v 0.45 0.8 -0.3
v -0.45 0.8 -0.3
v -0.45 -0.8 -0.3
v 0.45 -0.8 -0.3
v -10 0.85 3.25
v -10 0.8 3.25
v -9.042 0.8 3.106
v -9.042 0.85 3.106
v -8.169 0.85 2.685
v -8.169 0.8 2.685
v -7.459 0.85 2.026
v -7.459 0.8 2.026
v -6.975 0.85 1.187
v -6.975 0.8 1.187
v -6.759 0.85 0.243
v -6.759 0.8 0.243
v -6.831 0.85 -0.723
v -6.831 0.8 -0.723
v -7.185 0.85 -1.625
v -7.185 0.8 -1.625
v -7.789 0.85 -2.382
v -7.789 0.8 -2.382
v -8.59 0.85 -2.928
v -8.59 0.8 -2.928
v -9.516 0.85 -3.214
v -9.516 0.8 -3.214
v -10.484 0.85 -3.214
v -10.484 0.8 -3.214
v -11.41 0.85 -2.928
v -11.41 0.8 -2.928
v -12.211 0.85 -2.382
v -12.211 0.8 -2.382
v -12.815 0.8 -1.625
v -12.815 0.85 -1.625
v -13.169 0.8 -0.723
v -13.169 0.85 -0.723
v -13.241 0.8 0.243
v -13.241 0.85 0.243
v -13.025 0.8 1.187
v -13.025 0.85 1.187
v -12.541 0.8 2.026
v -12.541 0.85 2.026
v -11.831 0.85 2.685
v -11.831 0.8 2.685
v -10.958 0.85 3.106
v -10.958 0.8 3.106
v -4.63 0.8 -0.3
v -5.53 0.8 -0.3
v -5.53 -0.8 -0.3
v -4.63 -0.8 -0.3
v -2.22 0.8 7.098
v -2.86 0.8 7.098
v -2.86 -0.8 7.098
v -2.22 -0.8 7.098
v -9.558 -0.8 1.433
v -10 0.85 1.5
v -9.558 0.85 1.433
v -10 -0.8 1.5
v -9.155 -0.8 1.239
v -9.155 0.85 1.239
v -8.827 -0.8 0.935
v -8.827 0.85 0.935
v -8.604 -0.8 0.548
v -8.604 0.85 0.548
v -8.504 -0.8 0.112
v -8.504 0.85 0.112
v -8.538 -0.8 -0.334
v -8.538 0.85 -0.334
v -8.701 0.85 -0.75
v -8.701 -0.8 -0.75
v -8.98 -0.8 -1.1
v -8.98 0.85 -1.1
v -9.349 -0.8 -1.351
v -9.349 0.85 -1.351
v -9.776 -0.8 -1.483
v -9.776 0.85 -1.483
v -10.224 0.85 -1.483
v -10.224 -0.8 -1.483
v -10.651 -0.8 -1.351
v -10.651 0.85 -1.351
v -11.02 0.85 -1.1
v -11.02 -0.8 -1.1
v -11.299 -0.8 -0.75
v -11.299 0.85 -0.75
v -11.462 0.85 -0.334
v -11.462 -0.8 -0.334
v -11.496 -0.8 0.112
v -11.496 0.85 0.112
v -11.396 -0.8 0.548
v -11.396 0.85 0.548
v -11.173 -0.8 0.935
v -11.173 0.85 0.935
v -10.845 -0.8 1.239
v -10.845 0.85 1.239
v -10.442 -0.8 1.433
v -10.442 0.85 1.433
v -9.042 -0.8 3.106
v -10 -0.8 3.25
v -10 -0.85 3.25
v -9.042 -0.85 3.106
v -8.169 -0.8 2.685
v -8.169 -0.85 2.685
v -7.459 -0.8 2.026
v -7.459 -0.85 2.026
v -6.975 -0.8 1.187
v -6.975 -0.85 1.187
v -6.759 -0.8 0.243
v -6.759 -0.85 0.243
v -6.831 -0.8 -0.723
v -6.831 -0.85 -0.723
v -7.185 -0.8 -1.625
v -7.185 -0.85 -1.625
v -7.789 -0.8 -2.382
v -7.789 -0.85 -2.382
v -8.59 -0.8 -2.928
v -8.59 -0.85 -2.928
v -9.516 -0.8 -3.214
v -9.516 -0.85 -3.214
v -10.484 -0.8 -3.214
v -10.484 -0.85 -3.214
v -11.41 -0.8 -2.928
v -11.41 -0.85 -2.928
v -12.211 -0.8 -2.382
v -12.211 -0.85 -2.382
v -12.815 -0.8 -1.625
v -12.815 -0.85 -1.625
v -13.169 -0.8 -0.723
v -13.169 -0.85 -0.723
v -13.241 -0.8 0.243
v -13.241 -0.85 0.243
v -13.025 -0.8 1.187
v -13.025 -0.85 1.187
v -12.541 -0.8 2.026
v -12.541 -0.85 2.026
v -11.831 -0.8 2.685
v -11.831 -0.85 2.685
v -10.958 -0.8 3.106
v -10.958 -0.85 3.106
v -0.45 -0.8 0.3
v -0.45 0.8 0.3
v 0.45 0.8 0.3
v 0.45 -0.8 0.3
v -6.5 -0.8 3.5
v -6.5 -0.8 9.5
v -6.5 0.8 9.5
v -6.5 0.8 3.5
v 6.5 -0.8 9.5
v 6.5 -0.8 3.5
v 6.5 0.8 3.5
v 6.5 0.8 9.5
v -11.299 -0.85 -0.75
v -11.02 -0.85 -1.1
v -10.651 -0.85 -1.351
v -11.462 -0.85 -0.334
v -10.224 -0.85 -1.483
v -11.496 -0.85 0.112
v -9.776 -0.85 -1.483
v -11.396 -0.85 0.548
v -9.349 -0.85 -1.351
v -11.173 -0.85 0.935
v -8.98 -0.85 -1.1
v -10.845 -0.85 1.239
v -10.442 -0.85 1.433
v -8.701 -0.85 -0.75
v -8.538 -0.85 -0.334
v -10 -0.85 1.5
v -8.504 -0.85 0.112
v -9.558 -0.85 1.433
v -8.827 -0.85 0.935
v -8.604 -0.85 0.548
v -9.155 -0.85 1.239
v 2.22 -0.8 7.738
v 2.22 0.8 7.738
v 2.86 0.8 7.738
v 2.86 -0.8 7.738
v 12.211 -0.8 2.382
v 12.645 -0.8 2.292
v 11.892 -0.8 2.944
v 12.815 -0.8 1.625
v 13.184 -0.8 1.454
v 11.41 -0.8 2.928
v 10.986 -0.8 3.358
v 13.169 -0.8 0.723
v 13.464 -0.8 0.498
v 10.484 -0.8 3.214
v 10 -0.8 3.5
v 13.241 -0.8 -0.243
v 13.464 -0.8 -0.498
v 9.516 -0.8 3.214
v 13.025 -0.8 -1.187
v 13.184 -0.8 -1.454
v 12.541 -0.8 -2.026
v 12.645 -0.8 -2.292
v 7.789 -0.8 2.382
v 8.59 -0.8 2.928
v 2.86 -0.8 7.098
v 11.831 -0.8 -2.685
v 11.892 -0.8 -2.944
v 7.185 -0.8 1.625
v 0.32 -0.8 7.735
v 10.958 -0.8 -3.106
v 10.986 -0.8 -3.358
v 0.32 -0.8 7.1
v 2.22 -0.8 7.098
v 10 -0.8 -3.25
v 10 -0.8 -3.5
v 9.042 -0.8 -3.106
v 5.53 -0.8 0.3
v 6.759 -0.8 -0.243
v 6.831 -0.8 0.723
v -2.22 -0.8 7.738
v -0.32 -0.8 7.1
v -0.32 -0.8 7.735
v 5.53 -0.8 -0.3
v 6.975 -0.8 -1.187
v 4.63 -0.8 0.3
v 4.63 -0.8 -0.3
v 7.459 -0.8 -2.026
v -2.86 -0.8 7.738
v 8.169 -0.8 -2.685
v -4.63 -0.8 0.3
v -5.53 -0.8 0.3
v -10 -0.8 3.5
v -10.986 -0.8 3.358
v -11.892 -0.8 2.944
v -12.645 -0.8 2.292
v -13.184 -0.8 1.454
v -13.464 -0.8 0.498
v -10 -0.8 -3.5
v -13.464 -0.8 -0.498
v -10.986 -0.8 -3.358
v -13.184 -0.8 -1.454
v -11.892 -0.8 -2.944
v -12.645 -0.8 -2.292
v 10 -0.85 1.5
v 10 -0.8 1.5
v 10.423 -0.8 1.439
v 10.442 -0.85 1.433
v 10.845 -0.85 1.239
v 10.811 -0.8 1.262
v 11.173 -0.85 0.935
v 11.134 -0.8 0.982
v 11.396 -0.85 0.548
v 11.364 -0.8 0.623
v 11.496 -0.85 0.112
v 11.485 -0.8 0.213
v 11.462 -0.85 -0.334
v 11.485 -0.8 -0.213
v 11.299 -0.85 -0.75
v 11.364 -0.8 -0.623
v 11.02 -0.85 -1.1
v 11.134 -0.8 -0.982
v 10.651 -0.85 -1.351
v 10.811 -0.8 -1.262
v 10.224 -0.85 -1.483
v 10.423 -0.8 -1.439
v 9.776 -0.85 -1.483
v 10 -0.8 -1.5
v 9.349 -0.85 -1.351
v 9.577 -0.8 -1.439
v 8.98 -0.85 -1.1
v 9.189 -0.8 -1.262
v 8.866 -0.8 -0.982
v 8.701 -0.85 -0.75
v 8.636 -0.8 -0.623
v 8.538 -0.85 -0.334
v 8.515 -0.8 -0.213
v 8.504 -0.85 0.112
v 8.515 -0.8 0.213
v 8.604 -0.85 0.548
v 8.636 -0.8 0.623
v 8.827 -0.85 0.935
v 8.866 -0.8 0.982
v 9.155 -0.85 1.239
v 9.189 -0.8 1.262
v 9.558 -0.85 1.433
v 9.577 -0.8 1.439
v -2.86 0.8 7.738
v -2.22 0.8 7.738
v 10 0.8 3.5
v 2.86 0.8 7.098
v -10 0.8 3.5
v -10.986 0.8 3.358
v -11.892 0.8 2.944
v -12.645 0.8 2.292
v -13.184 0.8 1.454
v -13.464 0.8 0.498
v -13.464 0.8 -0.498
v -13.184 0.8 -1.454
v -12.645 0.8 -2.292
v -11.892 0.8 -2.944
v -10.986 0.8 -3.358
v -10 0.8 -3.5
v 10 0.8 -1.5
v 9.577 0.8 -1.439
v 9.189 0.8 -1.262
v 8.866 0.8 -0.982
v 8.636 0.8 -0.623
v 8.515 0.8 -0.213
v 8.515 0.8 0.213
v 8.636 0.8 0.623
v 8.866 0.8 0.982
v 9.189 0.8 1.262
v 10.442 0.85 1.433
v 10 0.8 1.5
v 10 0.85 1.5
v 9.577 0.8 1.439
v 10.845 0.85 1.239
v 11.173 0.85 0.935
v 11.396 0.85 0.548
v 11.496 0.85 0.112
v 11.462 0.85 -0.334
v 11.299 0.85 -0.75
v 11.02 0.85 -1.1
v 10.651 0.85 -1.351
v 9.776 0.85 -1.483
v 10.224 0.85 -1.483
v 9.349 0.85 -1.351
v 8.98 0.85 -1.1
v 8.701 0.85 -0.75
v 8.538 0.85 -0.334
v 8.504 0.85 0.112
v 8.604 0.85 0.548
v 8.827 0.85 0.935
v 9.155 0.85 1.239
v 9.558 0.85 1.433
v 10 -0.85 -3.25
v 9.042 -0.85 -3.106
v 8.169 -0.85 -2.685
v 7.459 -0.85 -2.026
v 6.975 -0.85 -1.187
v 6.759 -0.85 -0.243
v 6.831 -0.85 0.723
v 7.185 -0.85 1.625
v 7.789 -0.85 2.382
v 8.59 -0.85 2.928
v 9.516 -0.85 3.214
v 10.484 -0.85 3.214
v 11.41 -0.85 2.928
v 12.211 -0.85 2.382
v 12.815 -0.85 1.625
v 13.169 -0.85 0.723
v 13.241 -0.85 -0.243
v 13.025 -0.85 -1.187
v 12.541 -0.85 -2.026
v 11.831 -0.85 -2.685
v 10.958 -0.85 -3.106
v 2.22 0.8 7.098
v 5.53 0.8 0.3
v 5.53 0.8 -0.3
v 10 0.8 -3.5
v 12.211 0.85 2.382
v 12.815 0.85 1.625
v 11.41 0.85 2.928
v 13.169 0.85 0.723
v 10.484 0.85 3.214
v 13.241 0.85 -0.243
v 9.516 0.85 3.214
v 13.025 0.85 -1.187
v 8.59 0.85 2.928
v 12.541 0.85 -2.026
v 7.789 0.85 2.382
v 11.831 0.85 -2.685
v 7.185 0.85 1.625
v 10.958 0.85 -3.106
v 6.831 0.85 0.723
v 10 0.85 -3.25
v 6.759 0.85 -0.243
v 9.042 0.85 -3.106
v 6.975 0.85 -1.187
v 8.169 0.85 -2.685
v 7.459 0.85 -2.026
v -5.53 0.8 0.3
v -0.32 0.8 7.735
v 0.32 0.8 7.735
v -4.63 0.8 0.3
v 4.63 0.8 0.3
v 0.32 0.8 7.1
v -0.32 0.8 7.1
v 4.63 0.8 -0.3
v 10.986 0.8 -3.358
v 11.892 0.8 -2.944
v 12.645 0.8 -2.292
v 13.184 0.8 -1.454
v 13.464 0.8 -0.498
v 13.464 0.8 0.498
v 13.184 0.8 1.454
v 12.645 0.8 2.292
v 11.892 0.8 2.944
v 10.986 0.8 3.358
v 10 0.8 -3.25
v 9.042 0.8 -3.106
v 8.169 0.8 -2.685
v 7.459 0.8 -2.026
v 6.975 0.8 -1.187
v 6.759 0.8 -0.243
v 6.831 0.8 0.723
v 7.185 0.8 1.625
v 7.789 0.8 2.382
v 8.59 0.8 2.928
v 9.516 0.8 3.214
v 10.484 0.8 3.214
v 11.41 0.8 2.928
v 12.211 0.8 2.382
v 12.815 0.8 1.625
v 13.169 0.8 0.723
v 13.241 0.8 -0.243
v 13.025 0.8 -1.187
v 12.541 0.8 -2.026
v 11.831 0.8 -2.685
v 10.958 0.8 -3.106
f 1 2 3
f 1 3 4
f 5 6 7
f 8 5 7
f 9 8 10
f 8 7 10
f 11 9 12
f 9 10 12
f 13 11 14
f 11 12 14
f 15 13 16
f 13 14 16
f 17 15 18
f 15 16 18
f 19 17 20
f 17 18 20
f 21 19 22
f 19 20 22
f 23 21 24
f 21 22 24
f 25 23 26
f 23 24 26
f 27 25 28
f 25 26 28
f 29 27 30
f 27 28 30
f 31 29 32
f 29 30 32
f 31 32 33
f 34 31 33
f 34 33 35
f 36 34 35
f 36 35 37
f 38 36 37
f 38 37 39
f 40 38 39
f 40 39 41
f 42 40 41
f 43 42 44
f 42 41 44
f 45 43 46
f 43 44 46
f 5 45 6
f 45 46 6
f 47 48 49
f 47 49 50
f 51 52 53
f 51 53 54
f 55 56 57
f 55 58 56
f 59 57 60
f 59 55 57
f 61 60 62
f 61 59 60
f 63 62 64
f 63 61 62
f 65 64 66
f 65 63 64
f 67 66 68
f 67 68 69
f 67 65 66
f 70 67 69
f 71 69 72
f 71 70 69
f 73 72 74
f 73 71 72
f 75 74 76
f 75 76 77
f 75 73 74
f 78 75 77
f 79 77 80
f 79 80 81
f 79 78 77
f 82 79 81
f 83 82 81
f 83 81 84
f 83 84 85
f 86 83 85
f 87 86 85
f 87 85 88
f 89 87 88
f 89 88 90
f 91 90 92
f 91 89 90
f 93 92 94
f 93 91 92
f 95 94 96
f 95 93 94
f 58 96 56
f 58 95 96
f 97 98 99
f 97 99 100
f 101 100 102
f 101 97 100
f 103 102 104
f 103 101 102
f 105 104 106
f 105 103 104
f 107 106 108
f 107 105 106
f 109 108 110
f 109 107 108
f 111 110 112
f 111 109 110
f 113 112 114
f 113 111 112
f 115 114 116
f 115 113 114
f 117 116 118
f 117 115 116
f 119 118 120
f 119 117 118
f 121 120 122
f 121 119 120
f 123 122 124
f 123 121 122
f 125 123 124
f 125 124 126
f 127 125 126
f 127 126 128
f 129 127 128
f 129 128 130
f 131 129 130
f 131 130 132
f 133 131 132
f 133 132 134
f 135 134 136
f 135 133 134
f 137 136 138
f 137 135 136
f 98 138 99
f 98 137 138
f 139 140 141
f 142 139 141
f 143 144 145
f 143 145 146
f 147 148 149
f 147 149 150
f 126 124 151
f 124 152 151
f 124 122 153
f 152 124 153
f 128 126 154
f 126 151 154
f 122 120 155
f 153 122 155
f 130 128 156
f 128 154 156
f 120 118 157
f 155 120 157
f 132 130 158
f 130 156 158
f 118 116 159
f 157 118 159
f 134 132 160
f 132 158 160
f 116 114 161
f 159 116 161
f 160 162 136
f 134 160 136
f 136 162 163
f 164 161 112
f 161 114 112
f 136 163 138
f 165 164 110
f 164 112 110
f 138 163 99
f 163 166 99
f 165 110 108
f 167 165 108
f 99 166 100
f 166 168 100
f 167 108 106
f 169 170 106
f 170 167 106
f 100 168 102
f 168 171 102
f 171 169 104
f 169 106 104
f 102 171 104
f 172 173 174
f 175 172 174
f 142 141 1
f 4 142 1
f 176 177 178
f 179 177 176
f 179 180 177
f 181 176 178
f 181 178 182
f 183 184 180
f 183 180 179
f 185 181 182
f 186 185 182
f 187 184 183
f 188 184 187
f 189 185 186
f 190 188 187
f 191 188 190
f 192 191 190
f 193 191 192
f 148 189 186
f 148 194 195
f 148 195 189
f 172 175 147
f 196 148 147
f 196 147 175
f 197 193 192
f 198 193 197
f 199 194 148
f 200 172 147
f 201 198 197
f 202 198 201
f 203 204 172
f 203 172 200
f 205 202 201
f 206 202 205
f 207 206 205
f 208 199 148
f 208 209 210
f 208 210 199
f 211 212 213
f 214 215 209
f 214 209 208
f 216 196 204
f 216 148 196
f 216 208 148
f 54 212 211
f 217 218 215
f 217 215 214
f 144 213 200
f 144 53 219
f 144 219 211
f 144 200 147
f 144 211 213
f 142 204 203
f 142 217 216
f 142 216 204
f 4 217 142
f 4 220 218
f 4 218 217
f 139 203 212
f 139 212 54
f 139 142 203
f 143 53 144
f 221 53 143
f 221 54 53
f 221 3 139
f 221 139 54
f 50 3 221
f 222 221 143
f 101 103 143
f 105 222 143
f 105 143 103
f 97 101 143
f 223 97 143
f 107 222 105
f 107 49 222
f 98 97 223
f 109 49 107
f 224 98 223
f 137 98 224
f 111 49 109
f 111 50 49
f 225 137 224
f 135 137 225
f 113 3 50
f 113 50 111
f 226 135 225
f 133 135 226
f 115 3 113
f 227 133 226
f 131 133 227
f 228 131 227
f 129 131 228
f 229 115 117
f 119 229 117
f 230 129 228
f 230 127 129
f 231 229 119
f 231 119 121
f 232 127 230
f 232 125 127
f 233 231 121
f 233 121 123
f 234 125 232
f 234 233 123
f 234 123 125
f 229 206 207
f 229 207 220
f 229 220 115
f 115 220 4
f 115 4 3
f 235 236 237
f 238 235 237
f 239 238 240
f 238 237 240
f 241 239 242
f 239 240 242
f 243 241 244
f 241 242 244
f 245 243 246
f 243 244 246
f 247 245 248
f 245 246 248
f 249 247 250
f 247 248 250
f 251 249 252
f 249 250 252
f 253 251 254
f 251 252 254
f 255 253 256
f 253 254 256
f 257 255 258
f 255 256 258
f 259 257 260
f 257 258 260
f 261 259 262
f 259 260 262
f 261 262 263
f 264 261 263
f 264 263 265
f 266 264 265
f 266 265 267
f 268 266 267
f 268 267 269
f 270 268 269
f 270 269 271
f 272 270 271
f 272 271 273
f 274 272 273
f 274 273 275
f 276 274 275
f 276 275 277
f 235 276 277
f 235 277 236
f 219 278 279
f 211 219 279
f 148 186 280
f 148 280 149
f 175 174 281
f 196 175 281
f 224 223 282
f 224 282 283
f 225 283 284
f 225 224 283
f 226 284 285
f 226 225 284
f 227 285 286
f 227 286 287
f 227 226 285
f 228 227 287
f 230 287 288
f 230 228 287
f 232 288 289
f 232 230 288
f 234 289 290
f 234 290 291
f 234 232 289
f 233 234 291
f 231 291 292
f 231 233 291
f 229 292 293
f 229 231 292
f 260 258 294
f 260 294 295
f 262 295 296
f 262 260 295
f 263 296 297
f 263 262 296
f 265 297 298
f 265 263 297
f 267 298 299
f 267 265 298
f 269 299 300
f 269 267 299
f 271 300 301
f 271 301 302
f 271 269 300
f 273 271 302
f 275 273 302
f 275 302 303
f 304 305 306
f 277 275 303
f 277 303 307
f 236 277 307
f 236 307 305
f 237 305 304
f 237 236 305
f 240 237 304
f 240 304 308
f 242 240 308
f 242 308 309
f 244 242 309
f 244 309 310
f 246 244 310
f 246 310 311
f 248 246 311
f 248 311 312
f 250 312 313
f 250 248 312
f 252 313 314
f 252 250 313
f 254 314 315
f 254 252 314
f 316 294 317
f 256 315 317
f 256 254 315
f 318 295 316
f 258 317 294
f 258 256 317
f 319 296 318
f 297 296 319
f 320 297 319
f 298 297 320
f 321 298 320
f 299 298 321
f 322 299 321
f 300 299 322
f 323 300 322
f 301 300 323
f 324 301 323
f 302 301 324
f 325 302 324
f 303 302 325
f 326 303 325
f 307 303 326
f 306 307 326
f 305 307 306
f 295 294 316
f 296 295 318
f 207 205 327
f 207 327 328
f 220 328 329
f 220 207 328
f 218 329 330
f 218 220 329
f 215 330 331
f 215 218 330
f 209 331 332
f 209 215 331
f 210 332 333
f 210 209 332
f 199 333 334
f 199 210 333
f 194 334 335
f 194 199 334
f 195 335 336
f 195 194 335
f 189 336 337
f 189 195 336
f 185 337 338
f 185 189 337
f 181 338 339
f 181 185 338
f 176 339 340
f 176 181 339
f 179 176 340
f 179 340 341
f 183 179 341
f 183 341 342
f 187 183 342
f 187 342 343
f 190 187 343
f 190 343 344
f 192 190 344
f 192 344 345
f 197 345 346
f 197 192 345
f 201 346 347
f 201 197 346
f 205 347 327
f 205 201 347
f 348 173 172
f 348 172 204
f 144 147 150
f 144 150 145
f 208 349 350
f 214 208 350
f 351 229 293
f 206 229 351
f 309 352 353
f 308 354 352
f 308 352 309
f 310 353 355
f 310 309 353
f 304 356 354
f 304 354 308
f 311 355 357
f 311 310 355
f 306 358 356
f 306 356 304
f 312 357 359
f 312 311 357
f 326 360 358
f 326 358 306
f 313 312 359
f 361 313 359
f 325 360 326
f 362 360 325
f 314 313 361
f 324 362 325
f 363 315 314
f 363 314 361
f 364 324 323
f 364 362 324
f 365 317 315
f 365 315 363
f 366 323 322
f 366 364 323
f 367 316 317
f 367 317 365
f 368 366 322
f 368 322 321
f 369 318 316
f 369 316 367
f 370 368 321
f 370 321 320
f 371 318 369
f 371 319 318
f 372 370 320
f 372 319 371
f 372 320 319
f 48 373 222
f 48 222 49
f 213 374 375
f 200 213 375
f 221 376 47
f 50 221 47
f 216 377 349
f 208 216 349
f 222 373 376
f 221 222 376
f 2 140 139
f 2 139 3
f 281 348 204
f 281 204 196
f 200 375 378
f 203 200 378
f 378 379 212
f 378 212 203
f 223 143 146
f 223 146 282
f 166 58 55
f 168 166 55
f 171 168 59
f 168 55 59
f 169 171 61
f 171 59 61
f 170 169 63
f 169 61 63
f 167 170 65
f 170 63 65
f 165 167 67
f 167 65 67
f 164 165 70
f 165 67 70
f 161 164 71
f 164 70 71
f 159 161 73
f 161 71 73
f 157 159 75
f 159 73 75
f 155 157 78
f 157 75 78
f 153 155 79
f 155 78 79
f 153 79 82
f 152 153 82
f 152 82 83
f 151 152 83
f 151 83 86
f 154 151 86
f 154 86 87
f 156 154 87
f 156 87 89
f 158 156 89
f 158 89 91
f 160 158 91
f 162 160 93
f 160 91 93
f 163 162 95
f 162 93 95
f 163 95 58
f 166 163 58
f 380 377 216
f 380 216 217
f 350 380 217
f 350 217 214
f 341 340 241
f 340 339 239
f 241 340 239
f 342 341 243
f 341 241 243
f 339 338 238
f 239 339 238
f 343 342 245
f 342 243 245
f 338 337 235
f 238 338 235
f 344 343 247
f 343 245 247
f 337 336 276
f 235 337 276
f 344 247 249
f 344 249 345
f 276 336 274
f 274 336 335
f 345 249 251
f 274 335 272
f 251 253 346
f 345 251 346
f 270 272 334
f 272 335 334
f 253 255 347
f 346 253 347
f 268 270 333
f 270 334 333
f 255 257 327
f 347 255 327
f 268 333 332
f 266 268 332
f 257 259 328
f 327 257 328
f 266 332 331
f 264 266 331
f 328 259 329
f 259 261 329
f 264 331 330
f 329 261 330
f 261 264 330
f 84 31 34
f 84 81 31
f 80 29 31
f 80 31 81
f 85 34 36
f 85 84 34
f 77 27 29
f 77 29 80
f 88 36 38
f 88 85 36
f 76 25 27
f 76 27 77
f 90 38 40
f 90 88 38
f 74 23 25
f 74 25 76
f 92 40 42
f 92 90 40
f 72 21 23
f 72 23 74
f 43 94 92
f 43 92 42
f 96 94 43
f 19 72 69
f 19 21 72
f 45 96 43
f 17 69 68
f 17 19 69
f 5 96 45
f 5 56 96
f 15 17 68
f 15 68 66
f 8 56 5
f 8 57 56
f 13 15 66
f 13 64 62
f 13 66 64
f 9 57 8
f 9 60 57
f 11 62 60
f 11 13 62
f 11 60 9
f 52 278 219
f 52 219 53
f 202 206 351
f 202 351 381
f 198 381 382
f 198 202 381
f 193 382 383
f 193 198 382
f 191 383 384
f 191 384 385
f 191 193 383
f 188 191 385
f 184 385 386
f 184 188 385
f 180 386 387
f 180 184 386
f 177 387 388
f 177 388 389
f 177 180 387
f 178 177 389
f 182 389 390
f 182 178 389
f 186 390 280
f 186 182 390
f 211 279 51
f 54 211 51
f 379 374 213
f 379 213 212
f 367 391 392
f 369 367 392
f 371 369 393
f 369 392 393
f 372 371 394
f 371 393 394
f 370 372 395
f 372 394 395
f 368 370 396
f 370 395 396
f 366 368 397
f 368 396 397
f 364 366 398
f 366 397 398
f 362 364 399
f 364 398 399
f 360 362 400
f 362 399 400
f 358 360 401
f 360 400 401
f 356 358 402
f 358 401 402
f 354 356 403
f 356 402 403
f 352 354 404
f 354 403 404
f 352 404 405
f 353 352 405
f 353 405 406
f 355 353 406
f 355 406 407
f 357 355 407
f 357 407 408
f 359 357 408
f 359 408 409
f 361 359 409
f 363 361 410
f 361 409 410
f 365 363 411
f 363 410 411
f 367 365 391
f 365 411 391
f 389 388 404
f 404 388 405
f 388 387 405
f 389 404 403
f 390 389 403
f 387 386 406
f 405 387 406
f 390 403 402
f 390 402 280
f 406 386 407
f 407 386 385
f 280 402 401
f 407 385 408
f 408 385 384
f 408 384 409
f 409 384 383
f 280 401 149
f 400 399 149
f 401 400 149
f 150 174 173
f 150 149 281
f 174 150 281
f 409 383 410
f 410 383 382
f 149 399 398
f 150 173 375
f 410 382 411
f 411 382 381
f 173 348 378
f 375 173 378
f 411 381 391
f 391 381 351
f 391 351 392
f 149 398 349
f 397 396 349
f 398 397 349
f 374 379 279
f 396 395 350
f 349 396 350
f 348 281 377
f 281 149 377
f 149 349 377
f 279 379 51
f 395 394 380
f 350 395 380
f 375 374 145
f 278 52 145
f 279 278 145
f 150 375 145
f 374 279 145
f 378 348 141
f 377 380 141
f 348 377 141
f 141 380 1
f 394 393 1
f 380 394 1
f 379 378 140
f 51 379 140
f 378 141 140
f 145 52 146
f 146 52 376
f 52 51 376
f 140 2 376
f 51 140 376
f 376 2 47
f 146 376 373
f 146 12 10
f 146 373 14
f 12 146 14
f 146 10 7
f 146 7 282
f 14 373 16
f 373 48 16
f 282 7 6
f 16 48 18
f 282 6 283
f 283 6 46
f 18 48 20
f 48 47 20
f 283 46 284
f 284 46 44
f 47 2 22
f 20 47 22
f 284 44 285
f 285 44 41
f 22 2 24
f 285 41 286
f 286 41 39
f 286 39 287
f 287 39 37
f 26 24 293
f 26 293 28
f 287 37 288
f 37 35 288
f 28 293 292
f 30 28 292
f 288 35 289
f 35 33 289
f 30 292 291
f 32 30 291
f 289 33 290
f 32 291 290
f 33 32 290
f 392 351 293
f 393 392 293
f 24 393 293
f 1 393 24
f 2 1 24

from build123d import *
from build123d.topology import SkipClean

# Parameters (mm, degrees)
BOSS_EXTRUDE1_DEPTH      = 0.8
BOSS_EXTRUDE1_DEPTH_BACK = 0.8
SKETCH1_R                = 1.5
SKETCH4_R                = 3.25
SKETCH4_R_2              = 1.5
BOSS_EXTRUDE4_DEPTH      = 0.05
SKETCH5_W                = 0.64
SKETCH5_H                = 0.635
SKETCH5_H_2              = 0.64
CUT_EXTRUDE1_DEPTH       = 1.6
SKETCH6_W                = 0.9
SKETCH6_H                = 0.6
CUT_EXTRUDE2_DEPTH       = 1.6


with BuildPart() as part:
    # Sketch1 → Boss-Extrude1 (new, two sides: drawn at the far end of the back side and taken through both)
    with BuildSketch(Plane(origin=(0, 0, 0), x_dir=(1, 0, 0), z_dir=(0, 1, 0)).offset(-BOSS_EXTRUDE1_DEPTH_BACK)):
        with BuildLine():
            Line((-10, 3.5), (10, 3.5))
            ThreePointArc((10, 3.5), (13.5, 0), (10, -3.5))
            Line((10, -3.5), (6.5, -3.5))
            Line((6.5, -3.5), (6.5, -9.5))
            Line((6.5, -9.5), (-6.5, -9.5))
            Line((-6.5, -9.5), (-6.5, -3.5))
            Line((-6.5, -3.5), (-10, -3.5))
            ThreePointArc((-10, -3.5), (-13.5, 0), (-10, 3.5))
        make_face()
        with Locations(Location((-10, 0, 0), (0, 0, 270))):
            Circle(SKETCH1_R, mode=Mode.SUBTRACT)
        with Locations(Location((10, 0, 0), (0, 0, 90))):
            Circle(SKETCH1_R, mode=Mode.SUBTRACT)
    extrude(amount=BOSS_EXTRUDE1_DEPTH + BOSS_EXTRUDE1_DEPTH_BACK)

    # Sketch4 → Boss-Extrude4 (add)
    # profile 1 of 2: a face of its own
    with BuildSketch(Plane(origin=(0, 0.8, 0), x_dir=(1, 0, 0), z_dir=(0, 1, 0))):
        with Locations(Location((-10, 0, 0), (0, 0, 270))):
            Circle(SKETCH4_R)
        with Locations(Location((-10, 0, 0), (0, 0, 270))):
            Circle(SKETCH4_R_2, mode=Mode.SUBTRACT)
    # profile 2 of 2: a face of its own
    with BuildSketch(Plane(origin=(0, 0.8, 0), x_dir=(1, 0, 0), z_dir=(0, 1, 0))):
        with Locations(Location((10, 0, 0), (0, 0, 90))):
            Circle(SKETCH4_R)
        with Locations(Location((10, 0, 0), (0, 0, 270))):
            Circle(SKETCH4_R_2, mode=Mode.SUBTRACT)
    boss_extrude4 = extrude(amount=BOSS_EXTRUDE4_DEPTH)

    # Mirror1: Boss-Extrude4 across plane
    with SkipClean():  # the faces are left unmerged after this step: merging them gives an invalid solid
        add(boss_extrude4.mirror(Plane.ZX))

    # Sketch5 → Cut-Extrude1 (cut)
    with SkipClean():  # the faces are left unmerged after this step: merging them gives an invalid solid
        with BuildSketch(Plane(origin=(0, 0.8, 0), x_dir=(1, 0, 0), z_dir=(0, 1, 0))):
            with Locations((0, -7.4175)):
                Rectangle(SKETCH5_W, SKETCH5_H)
            with Locations((-2.54, -7.4175)):
                Rectangle(SKETCH5_W, SKETCH5_H_2)
            with Locations((2.54, -7.4175)):
                Rectangle(SKETCH5_W, SKETCH5_H_2)
        extrude(amount=-CUT_EXTRUDE1_DEPTH, mode=Mode.SUBTRACT)

    # Sketch6 → Cut-Extrude2 (cut)
    with SkipClean():  # the faces are left unmerged after this step: merging them gives an invalid solid
        with BuildSketch(Plane(origin=(0, 0.8, 0), x_dir=(1, 0, 0), z_dir=(0, 1, 0))):
            Rectangle(SKETCH6_W, SKETCH6_H)
            with Locations((-5.08, 0)):
                Rectangle(SKETCH6_W, SKETCH6_H)
            with Locations((5.08, 0)):
                Rectangle(SKETCH6_W, SKETCH6_H)
        extrude(amount=-CUT_EXTRUDE2_DEPTH, mode=Mode.SUBTRACT)


solid = part.part
